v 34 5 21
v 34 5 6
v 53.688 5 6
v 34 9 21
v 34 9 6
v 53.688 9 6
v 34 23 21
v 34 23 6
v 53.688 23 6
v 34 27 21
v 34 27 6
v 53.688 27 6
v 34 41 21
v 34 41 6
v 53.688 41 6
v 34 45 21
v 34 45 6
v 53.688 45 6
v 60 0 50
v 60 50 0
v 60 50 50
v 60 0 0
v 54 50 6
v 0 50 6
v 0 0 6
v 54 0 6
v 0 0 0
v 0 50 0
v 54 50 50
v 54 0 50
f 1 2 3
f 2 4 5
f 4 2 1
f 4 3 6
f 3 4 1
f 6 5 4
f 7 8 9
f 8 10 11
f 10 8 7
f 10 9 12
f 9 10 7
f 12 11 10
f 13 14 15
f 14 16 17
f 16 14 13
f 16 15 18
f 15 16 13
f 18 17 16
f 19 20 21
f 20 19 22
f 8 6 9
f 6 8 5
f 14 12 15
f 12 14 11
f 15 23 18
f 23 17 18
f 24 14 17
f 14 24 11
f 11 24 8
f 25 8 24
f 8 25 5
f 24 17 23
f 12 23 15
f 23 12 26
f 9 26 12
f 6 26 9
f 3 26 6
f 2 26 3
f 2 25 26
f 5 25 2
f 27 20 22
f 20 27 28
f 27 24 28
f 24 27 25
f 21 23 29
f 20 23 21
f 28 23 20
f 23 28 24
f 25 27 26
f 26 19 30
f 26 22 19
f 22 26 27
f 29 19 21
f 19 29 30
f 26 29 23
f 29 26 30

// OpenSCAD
$fn = 32;

// ----------------------------------------------------------------------
// Rib bracket: 3-gusset L bracket
// ----------------------------------------------------------------------

// --- parameters (mm) ---
base_l = 60;              // foot length, X
base_w = 50;              // foot width, Y
base_t = 6;               // foot thickness
plate_t = 6;              // upright plate thickness
plate_h = 50;             // overall height
gus_l = 20;               // gusset leg along the foot
gus_h = 16;               // gusset height
gus_t = 4;                // gusset thickness
gus_edge = 5;             // gusset margin from the foot edge
n_gus = 3;                // gusset count

gus_pitch = (base_w - 2 * gus_edge - gus_t) / (n_gus - 1);  // gusset pitch

union() {
  cube([base_l, base_w, base_t]);
  translate([base_l - plate_t, 0, base_t - 1])
    cube([plate_t, base_w, plate_h - base_t + 1]);
  for (i = [0 : n_gus - 1])
    translate([base_l - plate_t - gus_l, gus_edge + i * gus_pitch, base_t - 1])
      rotate([-90, 0, 0])
        linear_extrude(height = gus_t)
          polygon(points = [[0, 0], [gus_l + 1, 0], [0, -gus_h]]);
}
